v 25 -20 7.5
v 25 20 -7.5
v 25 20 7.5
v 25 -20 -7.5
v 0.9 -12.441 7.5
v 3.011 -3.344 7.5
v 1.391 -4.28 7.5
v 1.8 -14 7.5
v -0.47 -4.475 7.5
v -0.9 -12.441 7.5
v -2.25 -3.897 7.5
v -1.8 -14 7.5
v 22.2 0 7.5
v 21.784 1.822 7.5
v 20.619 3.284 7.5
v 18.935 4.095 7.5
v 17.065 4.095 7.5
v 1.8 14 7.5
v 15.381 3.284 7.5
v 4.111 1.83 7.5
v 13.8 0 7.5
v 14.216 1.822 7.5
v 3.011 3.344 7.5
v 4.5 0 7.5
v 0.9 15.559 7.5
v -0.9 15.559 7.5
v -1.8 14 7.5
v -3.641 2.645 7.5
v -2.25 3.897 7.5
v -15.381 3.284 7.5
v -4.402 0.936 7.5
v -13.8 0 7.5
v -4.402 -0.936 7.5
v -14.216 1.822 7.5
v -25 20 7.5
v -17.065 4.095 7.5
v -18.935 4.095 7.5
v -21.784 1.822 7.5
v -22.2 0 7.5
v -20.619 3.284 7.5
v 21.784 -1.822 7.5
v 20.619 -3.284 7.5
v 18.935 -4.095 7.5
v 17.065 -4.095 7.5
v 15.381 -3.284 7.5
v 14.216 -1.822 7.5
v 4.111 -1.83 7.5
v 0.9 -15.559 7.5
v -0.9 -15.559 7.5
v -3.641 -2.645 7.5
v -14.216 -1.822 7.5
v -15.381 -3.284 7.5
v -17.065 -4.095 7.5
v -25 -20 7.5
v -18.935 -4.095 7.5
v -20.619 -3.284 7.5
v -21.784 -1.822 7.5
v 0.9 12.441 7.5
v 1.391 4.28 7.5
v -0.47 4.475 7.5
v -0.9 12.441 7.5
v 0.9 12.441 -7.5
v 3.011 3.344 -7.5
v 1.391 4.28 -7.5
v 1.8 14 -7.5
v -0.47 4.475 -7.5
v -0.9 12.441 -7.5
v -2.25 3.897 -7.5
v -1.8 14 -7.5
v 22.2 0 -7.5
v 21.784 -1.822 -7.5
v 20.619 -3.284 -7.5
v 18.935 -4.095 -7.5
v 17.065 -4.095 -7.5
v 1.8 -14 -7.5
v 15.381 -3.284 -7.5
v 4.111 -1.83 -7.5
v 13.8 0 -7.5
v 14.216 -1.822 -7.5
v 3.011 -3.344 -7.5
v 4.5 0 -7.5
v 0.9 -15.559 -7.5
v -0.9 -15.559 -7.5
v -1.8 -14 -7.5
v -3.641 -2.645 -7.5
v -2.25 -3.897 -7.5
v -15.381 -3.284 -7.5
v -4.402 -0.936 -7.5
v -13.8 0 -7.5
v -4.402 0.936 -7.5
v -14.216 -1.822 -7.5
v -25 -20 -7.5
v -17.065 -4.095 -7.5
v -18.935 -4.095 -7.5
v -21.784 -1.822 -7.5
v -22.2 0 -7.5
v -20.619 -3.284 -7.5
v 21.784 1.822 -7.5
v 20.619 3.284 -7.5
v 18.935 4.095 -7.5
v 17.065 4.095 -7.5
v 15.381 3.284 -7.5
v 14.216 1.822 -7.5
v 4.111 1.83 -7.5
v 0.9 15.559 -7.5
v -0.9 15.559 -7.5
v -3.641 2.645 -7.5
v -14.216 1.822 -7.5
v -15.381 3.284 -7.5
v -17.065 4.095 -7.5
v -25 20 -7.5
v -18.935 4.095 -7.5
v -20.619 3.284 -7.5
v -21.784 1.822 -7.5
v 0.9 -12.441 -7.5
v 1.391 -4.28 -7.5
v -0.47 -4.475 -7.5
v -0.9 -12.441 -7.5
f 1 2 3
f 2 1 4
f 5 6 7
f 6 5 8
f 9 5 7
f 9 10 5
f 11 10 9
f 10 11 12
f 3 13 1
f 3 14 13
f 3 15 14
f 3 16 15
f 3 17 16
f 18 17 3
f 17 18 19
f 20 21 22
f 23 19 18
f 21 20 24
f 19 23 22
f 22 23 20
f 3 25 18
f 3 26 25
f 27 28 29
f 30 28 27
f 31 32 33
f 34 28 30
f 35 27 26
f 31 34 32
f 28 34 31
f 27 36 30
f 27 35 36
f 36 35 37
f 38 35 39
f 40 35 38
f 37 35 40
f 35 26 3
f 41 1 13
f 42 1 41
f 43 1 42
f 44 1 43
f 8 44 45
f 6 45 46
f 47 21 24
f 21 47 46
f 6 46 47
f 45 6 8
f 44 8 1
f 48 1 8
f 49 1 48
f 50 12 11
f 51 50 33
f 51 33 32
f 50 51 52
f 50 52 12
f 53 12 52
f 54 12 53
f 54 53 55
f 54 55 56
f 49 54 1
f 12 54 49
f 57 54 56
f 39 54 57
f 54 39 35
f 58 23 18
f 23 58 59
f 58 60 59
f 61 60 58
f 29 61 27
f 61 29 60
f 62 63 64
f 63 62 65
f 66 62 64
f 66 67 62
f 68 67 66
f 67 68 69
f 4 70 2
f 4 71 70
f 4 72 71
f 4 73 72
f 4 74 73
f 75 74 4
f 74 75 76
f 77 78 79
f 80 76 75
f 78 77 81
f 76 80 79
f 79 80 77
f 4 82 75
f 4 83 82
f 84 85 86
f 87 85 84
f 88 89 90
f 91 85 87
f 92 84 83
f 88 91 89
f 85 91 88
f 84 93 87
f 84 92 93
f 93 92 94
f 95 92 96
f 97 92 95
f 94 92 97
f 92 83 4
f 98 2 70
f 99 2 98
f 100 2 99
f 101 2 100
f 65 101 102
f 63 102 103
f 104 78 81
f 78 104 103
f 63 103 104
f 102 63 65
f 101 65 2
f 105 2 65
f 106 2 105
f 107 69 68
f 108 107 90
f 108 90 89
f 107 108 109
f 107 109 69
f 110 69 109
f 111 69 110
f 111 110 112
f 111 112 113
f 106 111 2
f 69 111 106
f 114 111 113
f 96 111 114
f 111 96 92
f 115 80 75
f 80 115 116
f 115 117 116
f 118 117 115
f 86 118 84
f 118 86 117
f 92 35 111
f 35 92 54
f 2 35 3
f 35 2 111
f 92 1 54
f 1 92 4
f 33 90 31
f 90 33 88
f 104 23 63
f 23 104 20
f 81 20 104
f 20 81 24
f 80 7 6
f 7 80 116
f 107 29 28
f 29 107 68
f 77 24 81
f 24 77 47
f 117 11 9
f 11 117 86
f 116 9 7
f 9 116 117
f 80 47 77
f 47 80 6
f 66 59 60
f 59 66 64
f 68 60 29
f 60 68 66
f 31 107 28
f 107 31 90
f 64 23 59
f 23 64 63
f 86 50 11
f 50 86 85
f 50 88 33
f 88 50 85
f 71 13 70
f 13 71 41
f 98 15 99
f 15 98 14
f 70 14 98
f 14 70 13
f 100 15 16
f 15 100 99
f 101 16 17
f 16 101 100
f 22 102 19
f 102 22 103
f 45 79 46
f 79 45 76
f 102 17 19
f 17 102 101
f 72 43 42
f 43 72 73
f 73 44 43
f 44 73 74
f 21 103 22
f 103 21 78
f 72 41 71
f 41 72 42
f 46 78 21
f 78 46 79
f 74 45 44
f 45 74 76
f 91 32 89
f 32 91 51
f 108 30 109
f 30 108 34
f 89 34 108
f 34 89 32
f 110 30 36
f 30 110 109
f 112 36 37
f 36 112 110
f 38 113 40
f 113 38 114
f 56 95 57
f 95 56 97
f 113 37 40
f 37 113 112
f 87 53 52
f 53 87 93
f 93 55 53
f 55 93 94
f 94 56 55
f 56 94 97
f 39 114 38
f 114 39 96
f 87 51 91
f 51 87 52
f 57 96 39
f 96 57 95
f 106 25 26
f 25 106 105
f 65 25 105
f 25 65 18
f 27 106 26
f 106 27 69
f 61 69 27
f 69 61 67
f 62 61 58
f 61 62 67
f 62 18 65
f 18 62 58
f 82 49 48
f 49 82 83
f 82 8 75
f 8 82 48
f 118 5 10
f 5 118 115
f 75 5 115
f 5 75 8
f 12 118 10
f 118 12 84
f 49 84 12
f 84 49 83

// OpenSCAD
// AgriProbe - Parametric Carriage & Motor Mount Script
// Compatible with OpenSCAD Online / Desktop Modeler

module carriage_mount() {
    difference() {
        // Main structural block for the linear carriage
        cube([50, 40, 15], center = true);
        
        // T8 Lead Screw clearance hole
        cylinder(h = 20, r = 4.5, center = true);
        
        // Guide rod holes for twin 8mm smooth rods
        translate([18, 0, 0])
            cylinder(h = 20, r = 4.2, center = true);
        translate([-18, 0, 0])
            cylinder(h = 20, r = 4.2, center = true);
            
        // Mounting screw holes
        translate([0, 14, 0])
            cylinder(h = 20, r = 1.8, center = true);
        translate([0, -14, 0])
            cylinder(h = 20, r = 1.8, center = true);
    }
}

// Render the 3D model
carriage_mount();
